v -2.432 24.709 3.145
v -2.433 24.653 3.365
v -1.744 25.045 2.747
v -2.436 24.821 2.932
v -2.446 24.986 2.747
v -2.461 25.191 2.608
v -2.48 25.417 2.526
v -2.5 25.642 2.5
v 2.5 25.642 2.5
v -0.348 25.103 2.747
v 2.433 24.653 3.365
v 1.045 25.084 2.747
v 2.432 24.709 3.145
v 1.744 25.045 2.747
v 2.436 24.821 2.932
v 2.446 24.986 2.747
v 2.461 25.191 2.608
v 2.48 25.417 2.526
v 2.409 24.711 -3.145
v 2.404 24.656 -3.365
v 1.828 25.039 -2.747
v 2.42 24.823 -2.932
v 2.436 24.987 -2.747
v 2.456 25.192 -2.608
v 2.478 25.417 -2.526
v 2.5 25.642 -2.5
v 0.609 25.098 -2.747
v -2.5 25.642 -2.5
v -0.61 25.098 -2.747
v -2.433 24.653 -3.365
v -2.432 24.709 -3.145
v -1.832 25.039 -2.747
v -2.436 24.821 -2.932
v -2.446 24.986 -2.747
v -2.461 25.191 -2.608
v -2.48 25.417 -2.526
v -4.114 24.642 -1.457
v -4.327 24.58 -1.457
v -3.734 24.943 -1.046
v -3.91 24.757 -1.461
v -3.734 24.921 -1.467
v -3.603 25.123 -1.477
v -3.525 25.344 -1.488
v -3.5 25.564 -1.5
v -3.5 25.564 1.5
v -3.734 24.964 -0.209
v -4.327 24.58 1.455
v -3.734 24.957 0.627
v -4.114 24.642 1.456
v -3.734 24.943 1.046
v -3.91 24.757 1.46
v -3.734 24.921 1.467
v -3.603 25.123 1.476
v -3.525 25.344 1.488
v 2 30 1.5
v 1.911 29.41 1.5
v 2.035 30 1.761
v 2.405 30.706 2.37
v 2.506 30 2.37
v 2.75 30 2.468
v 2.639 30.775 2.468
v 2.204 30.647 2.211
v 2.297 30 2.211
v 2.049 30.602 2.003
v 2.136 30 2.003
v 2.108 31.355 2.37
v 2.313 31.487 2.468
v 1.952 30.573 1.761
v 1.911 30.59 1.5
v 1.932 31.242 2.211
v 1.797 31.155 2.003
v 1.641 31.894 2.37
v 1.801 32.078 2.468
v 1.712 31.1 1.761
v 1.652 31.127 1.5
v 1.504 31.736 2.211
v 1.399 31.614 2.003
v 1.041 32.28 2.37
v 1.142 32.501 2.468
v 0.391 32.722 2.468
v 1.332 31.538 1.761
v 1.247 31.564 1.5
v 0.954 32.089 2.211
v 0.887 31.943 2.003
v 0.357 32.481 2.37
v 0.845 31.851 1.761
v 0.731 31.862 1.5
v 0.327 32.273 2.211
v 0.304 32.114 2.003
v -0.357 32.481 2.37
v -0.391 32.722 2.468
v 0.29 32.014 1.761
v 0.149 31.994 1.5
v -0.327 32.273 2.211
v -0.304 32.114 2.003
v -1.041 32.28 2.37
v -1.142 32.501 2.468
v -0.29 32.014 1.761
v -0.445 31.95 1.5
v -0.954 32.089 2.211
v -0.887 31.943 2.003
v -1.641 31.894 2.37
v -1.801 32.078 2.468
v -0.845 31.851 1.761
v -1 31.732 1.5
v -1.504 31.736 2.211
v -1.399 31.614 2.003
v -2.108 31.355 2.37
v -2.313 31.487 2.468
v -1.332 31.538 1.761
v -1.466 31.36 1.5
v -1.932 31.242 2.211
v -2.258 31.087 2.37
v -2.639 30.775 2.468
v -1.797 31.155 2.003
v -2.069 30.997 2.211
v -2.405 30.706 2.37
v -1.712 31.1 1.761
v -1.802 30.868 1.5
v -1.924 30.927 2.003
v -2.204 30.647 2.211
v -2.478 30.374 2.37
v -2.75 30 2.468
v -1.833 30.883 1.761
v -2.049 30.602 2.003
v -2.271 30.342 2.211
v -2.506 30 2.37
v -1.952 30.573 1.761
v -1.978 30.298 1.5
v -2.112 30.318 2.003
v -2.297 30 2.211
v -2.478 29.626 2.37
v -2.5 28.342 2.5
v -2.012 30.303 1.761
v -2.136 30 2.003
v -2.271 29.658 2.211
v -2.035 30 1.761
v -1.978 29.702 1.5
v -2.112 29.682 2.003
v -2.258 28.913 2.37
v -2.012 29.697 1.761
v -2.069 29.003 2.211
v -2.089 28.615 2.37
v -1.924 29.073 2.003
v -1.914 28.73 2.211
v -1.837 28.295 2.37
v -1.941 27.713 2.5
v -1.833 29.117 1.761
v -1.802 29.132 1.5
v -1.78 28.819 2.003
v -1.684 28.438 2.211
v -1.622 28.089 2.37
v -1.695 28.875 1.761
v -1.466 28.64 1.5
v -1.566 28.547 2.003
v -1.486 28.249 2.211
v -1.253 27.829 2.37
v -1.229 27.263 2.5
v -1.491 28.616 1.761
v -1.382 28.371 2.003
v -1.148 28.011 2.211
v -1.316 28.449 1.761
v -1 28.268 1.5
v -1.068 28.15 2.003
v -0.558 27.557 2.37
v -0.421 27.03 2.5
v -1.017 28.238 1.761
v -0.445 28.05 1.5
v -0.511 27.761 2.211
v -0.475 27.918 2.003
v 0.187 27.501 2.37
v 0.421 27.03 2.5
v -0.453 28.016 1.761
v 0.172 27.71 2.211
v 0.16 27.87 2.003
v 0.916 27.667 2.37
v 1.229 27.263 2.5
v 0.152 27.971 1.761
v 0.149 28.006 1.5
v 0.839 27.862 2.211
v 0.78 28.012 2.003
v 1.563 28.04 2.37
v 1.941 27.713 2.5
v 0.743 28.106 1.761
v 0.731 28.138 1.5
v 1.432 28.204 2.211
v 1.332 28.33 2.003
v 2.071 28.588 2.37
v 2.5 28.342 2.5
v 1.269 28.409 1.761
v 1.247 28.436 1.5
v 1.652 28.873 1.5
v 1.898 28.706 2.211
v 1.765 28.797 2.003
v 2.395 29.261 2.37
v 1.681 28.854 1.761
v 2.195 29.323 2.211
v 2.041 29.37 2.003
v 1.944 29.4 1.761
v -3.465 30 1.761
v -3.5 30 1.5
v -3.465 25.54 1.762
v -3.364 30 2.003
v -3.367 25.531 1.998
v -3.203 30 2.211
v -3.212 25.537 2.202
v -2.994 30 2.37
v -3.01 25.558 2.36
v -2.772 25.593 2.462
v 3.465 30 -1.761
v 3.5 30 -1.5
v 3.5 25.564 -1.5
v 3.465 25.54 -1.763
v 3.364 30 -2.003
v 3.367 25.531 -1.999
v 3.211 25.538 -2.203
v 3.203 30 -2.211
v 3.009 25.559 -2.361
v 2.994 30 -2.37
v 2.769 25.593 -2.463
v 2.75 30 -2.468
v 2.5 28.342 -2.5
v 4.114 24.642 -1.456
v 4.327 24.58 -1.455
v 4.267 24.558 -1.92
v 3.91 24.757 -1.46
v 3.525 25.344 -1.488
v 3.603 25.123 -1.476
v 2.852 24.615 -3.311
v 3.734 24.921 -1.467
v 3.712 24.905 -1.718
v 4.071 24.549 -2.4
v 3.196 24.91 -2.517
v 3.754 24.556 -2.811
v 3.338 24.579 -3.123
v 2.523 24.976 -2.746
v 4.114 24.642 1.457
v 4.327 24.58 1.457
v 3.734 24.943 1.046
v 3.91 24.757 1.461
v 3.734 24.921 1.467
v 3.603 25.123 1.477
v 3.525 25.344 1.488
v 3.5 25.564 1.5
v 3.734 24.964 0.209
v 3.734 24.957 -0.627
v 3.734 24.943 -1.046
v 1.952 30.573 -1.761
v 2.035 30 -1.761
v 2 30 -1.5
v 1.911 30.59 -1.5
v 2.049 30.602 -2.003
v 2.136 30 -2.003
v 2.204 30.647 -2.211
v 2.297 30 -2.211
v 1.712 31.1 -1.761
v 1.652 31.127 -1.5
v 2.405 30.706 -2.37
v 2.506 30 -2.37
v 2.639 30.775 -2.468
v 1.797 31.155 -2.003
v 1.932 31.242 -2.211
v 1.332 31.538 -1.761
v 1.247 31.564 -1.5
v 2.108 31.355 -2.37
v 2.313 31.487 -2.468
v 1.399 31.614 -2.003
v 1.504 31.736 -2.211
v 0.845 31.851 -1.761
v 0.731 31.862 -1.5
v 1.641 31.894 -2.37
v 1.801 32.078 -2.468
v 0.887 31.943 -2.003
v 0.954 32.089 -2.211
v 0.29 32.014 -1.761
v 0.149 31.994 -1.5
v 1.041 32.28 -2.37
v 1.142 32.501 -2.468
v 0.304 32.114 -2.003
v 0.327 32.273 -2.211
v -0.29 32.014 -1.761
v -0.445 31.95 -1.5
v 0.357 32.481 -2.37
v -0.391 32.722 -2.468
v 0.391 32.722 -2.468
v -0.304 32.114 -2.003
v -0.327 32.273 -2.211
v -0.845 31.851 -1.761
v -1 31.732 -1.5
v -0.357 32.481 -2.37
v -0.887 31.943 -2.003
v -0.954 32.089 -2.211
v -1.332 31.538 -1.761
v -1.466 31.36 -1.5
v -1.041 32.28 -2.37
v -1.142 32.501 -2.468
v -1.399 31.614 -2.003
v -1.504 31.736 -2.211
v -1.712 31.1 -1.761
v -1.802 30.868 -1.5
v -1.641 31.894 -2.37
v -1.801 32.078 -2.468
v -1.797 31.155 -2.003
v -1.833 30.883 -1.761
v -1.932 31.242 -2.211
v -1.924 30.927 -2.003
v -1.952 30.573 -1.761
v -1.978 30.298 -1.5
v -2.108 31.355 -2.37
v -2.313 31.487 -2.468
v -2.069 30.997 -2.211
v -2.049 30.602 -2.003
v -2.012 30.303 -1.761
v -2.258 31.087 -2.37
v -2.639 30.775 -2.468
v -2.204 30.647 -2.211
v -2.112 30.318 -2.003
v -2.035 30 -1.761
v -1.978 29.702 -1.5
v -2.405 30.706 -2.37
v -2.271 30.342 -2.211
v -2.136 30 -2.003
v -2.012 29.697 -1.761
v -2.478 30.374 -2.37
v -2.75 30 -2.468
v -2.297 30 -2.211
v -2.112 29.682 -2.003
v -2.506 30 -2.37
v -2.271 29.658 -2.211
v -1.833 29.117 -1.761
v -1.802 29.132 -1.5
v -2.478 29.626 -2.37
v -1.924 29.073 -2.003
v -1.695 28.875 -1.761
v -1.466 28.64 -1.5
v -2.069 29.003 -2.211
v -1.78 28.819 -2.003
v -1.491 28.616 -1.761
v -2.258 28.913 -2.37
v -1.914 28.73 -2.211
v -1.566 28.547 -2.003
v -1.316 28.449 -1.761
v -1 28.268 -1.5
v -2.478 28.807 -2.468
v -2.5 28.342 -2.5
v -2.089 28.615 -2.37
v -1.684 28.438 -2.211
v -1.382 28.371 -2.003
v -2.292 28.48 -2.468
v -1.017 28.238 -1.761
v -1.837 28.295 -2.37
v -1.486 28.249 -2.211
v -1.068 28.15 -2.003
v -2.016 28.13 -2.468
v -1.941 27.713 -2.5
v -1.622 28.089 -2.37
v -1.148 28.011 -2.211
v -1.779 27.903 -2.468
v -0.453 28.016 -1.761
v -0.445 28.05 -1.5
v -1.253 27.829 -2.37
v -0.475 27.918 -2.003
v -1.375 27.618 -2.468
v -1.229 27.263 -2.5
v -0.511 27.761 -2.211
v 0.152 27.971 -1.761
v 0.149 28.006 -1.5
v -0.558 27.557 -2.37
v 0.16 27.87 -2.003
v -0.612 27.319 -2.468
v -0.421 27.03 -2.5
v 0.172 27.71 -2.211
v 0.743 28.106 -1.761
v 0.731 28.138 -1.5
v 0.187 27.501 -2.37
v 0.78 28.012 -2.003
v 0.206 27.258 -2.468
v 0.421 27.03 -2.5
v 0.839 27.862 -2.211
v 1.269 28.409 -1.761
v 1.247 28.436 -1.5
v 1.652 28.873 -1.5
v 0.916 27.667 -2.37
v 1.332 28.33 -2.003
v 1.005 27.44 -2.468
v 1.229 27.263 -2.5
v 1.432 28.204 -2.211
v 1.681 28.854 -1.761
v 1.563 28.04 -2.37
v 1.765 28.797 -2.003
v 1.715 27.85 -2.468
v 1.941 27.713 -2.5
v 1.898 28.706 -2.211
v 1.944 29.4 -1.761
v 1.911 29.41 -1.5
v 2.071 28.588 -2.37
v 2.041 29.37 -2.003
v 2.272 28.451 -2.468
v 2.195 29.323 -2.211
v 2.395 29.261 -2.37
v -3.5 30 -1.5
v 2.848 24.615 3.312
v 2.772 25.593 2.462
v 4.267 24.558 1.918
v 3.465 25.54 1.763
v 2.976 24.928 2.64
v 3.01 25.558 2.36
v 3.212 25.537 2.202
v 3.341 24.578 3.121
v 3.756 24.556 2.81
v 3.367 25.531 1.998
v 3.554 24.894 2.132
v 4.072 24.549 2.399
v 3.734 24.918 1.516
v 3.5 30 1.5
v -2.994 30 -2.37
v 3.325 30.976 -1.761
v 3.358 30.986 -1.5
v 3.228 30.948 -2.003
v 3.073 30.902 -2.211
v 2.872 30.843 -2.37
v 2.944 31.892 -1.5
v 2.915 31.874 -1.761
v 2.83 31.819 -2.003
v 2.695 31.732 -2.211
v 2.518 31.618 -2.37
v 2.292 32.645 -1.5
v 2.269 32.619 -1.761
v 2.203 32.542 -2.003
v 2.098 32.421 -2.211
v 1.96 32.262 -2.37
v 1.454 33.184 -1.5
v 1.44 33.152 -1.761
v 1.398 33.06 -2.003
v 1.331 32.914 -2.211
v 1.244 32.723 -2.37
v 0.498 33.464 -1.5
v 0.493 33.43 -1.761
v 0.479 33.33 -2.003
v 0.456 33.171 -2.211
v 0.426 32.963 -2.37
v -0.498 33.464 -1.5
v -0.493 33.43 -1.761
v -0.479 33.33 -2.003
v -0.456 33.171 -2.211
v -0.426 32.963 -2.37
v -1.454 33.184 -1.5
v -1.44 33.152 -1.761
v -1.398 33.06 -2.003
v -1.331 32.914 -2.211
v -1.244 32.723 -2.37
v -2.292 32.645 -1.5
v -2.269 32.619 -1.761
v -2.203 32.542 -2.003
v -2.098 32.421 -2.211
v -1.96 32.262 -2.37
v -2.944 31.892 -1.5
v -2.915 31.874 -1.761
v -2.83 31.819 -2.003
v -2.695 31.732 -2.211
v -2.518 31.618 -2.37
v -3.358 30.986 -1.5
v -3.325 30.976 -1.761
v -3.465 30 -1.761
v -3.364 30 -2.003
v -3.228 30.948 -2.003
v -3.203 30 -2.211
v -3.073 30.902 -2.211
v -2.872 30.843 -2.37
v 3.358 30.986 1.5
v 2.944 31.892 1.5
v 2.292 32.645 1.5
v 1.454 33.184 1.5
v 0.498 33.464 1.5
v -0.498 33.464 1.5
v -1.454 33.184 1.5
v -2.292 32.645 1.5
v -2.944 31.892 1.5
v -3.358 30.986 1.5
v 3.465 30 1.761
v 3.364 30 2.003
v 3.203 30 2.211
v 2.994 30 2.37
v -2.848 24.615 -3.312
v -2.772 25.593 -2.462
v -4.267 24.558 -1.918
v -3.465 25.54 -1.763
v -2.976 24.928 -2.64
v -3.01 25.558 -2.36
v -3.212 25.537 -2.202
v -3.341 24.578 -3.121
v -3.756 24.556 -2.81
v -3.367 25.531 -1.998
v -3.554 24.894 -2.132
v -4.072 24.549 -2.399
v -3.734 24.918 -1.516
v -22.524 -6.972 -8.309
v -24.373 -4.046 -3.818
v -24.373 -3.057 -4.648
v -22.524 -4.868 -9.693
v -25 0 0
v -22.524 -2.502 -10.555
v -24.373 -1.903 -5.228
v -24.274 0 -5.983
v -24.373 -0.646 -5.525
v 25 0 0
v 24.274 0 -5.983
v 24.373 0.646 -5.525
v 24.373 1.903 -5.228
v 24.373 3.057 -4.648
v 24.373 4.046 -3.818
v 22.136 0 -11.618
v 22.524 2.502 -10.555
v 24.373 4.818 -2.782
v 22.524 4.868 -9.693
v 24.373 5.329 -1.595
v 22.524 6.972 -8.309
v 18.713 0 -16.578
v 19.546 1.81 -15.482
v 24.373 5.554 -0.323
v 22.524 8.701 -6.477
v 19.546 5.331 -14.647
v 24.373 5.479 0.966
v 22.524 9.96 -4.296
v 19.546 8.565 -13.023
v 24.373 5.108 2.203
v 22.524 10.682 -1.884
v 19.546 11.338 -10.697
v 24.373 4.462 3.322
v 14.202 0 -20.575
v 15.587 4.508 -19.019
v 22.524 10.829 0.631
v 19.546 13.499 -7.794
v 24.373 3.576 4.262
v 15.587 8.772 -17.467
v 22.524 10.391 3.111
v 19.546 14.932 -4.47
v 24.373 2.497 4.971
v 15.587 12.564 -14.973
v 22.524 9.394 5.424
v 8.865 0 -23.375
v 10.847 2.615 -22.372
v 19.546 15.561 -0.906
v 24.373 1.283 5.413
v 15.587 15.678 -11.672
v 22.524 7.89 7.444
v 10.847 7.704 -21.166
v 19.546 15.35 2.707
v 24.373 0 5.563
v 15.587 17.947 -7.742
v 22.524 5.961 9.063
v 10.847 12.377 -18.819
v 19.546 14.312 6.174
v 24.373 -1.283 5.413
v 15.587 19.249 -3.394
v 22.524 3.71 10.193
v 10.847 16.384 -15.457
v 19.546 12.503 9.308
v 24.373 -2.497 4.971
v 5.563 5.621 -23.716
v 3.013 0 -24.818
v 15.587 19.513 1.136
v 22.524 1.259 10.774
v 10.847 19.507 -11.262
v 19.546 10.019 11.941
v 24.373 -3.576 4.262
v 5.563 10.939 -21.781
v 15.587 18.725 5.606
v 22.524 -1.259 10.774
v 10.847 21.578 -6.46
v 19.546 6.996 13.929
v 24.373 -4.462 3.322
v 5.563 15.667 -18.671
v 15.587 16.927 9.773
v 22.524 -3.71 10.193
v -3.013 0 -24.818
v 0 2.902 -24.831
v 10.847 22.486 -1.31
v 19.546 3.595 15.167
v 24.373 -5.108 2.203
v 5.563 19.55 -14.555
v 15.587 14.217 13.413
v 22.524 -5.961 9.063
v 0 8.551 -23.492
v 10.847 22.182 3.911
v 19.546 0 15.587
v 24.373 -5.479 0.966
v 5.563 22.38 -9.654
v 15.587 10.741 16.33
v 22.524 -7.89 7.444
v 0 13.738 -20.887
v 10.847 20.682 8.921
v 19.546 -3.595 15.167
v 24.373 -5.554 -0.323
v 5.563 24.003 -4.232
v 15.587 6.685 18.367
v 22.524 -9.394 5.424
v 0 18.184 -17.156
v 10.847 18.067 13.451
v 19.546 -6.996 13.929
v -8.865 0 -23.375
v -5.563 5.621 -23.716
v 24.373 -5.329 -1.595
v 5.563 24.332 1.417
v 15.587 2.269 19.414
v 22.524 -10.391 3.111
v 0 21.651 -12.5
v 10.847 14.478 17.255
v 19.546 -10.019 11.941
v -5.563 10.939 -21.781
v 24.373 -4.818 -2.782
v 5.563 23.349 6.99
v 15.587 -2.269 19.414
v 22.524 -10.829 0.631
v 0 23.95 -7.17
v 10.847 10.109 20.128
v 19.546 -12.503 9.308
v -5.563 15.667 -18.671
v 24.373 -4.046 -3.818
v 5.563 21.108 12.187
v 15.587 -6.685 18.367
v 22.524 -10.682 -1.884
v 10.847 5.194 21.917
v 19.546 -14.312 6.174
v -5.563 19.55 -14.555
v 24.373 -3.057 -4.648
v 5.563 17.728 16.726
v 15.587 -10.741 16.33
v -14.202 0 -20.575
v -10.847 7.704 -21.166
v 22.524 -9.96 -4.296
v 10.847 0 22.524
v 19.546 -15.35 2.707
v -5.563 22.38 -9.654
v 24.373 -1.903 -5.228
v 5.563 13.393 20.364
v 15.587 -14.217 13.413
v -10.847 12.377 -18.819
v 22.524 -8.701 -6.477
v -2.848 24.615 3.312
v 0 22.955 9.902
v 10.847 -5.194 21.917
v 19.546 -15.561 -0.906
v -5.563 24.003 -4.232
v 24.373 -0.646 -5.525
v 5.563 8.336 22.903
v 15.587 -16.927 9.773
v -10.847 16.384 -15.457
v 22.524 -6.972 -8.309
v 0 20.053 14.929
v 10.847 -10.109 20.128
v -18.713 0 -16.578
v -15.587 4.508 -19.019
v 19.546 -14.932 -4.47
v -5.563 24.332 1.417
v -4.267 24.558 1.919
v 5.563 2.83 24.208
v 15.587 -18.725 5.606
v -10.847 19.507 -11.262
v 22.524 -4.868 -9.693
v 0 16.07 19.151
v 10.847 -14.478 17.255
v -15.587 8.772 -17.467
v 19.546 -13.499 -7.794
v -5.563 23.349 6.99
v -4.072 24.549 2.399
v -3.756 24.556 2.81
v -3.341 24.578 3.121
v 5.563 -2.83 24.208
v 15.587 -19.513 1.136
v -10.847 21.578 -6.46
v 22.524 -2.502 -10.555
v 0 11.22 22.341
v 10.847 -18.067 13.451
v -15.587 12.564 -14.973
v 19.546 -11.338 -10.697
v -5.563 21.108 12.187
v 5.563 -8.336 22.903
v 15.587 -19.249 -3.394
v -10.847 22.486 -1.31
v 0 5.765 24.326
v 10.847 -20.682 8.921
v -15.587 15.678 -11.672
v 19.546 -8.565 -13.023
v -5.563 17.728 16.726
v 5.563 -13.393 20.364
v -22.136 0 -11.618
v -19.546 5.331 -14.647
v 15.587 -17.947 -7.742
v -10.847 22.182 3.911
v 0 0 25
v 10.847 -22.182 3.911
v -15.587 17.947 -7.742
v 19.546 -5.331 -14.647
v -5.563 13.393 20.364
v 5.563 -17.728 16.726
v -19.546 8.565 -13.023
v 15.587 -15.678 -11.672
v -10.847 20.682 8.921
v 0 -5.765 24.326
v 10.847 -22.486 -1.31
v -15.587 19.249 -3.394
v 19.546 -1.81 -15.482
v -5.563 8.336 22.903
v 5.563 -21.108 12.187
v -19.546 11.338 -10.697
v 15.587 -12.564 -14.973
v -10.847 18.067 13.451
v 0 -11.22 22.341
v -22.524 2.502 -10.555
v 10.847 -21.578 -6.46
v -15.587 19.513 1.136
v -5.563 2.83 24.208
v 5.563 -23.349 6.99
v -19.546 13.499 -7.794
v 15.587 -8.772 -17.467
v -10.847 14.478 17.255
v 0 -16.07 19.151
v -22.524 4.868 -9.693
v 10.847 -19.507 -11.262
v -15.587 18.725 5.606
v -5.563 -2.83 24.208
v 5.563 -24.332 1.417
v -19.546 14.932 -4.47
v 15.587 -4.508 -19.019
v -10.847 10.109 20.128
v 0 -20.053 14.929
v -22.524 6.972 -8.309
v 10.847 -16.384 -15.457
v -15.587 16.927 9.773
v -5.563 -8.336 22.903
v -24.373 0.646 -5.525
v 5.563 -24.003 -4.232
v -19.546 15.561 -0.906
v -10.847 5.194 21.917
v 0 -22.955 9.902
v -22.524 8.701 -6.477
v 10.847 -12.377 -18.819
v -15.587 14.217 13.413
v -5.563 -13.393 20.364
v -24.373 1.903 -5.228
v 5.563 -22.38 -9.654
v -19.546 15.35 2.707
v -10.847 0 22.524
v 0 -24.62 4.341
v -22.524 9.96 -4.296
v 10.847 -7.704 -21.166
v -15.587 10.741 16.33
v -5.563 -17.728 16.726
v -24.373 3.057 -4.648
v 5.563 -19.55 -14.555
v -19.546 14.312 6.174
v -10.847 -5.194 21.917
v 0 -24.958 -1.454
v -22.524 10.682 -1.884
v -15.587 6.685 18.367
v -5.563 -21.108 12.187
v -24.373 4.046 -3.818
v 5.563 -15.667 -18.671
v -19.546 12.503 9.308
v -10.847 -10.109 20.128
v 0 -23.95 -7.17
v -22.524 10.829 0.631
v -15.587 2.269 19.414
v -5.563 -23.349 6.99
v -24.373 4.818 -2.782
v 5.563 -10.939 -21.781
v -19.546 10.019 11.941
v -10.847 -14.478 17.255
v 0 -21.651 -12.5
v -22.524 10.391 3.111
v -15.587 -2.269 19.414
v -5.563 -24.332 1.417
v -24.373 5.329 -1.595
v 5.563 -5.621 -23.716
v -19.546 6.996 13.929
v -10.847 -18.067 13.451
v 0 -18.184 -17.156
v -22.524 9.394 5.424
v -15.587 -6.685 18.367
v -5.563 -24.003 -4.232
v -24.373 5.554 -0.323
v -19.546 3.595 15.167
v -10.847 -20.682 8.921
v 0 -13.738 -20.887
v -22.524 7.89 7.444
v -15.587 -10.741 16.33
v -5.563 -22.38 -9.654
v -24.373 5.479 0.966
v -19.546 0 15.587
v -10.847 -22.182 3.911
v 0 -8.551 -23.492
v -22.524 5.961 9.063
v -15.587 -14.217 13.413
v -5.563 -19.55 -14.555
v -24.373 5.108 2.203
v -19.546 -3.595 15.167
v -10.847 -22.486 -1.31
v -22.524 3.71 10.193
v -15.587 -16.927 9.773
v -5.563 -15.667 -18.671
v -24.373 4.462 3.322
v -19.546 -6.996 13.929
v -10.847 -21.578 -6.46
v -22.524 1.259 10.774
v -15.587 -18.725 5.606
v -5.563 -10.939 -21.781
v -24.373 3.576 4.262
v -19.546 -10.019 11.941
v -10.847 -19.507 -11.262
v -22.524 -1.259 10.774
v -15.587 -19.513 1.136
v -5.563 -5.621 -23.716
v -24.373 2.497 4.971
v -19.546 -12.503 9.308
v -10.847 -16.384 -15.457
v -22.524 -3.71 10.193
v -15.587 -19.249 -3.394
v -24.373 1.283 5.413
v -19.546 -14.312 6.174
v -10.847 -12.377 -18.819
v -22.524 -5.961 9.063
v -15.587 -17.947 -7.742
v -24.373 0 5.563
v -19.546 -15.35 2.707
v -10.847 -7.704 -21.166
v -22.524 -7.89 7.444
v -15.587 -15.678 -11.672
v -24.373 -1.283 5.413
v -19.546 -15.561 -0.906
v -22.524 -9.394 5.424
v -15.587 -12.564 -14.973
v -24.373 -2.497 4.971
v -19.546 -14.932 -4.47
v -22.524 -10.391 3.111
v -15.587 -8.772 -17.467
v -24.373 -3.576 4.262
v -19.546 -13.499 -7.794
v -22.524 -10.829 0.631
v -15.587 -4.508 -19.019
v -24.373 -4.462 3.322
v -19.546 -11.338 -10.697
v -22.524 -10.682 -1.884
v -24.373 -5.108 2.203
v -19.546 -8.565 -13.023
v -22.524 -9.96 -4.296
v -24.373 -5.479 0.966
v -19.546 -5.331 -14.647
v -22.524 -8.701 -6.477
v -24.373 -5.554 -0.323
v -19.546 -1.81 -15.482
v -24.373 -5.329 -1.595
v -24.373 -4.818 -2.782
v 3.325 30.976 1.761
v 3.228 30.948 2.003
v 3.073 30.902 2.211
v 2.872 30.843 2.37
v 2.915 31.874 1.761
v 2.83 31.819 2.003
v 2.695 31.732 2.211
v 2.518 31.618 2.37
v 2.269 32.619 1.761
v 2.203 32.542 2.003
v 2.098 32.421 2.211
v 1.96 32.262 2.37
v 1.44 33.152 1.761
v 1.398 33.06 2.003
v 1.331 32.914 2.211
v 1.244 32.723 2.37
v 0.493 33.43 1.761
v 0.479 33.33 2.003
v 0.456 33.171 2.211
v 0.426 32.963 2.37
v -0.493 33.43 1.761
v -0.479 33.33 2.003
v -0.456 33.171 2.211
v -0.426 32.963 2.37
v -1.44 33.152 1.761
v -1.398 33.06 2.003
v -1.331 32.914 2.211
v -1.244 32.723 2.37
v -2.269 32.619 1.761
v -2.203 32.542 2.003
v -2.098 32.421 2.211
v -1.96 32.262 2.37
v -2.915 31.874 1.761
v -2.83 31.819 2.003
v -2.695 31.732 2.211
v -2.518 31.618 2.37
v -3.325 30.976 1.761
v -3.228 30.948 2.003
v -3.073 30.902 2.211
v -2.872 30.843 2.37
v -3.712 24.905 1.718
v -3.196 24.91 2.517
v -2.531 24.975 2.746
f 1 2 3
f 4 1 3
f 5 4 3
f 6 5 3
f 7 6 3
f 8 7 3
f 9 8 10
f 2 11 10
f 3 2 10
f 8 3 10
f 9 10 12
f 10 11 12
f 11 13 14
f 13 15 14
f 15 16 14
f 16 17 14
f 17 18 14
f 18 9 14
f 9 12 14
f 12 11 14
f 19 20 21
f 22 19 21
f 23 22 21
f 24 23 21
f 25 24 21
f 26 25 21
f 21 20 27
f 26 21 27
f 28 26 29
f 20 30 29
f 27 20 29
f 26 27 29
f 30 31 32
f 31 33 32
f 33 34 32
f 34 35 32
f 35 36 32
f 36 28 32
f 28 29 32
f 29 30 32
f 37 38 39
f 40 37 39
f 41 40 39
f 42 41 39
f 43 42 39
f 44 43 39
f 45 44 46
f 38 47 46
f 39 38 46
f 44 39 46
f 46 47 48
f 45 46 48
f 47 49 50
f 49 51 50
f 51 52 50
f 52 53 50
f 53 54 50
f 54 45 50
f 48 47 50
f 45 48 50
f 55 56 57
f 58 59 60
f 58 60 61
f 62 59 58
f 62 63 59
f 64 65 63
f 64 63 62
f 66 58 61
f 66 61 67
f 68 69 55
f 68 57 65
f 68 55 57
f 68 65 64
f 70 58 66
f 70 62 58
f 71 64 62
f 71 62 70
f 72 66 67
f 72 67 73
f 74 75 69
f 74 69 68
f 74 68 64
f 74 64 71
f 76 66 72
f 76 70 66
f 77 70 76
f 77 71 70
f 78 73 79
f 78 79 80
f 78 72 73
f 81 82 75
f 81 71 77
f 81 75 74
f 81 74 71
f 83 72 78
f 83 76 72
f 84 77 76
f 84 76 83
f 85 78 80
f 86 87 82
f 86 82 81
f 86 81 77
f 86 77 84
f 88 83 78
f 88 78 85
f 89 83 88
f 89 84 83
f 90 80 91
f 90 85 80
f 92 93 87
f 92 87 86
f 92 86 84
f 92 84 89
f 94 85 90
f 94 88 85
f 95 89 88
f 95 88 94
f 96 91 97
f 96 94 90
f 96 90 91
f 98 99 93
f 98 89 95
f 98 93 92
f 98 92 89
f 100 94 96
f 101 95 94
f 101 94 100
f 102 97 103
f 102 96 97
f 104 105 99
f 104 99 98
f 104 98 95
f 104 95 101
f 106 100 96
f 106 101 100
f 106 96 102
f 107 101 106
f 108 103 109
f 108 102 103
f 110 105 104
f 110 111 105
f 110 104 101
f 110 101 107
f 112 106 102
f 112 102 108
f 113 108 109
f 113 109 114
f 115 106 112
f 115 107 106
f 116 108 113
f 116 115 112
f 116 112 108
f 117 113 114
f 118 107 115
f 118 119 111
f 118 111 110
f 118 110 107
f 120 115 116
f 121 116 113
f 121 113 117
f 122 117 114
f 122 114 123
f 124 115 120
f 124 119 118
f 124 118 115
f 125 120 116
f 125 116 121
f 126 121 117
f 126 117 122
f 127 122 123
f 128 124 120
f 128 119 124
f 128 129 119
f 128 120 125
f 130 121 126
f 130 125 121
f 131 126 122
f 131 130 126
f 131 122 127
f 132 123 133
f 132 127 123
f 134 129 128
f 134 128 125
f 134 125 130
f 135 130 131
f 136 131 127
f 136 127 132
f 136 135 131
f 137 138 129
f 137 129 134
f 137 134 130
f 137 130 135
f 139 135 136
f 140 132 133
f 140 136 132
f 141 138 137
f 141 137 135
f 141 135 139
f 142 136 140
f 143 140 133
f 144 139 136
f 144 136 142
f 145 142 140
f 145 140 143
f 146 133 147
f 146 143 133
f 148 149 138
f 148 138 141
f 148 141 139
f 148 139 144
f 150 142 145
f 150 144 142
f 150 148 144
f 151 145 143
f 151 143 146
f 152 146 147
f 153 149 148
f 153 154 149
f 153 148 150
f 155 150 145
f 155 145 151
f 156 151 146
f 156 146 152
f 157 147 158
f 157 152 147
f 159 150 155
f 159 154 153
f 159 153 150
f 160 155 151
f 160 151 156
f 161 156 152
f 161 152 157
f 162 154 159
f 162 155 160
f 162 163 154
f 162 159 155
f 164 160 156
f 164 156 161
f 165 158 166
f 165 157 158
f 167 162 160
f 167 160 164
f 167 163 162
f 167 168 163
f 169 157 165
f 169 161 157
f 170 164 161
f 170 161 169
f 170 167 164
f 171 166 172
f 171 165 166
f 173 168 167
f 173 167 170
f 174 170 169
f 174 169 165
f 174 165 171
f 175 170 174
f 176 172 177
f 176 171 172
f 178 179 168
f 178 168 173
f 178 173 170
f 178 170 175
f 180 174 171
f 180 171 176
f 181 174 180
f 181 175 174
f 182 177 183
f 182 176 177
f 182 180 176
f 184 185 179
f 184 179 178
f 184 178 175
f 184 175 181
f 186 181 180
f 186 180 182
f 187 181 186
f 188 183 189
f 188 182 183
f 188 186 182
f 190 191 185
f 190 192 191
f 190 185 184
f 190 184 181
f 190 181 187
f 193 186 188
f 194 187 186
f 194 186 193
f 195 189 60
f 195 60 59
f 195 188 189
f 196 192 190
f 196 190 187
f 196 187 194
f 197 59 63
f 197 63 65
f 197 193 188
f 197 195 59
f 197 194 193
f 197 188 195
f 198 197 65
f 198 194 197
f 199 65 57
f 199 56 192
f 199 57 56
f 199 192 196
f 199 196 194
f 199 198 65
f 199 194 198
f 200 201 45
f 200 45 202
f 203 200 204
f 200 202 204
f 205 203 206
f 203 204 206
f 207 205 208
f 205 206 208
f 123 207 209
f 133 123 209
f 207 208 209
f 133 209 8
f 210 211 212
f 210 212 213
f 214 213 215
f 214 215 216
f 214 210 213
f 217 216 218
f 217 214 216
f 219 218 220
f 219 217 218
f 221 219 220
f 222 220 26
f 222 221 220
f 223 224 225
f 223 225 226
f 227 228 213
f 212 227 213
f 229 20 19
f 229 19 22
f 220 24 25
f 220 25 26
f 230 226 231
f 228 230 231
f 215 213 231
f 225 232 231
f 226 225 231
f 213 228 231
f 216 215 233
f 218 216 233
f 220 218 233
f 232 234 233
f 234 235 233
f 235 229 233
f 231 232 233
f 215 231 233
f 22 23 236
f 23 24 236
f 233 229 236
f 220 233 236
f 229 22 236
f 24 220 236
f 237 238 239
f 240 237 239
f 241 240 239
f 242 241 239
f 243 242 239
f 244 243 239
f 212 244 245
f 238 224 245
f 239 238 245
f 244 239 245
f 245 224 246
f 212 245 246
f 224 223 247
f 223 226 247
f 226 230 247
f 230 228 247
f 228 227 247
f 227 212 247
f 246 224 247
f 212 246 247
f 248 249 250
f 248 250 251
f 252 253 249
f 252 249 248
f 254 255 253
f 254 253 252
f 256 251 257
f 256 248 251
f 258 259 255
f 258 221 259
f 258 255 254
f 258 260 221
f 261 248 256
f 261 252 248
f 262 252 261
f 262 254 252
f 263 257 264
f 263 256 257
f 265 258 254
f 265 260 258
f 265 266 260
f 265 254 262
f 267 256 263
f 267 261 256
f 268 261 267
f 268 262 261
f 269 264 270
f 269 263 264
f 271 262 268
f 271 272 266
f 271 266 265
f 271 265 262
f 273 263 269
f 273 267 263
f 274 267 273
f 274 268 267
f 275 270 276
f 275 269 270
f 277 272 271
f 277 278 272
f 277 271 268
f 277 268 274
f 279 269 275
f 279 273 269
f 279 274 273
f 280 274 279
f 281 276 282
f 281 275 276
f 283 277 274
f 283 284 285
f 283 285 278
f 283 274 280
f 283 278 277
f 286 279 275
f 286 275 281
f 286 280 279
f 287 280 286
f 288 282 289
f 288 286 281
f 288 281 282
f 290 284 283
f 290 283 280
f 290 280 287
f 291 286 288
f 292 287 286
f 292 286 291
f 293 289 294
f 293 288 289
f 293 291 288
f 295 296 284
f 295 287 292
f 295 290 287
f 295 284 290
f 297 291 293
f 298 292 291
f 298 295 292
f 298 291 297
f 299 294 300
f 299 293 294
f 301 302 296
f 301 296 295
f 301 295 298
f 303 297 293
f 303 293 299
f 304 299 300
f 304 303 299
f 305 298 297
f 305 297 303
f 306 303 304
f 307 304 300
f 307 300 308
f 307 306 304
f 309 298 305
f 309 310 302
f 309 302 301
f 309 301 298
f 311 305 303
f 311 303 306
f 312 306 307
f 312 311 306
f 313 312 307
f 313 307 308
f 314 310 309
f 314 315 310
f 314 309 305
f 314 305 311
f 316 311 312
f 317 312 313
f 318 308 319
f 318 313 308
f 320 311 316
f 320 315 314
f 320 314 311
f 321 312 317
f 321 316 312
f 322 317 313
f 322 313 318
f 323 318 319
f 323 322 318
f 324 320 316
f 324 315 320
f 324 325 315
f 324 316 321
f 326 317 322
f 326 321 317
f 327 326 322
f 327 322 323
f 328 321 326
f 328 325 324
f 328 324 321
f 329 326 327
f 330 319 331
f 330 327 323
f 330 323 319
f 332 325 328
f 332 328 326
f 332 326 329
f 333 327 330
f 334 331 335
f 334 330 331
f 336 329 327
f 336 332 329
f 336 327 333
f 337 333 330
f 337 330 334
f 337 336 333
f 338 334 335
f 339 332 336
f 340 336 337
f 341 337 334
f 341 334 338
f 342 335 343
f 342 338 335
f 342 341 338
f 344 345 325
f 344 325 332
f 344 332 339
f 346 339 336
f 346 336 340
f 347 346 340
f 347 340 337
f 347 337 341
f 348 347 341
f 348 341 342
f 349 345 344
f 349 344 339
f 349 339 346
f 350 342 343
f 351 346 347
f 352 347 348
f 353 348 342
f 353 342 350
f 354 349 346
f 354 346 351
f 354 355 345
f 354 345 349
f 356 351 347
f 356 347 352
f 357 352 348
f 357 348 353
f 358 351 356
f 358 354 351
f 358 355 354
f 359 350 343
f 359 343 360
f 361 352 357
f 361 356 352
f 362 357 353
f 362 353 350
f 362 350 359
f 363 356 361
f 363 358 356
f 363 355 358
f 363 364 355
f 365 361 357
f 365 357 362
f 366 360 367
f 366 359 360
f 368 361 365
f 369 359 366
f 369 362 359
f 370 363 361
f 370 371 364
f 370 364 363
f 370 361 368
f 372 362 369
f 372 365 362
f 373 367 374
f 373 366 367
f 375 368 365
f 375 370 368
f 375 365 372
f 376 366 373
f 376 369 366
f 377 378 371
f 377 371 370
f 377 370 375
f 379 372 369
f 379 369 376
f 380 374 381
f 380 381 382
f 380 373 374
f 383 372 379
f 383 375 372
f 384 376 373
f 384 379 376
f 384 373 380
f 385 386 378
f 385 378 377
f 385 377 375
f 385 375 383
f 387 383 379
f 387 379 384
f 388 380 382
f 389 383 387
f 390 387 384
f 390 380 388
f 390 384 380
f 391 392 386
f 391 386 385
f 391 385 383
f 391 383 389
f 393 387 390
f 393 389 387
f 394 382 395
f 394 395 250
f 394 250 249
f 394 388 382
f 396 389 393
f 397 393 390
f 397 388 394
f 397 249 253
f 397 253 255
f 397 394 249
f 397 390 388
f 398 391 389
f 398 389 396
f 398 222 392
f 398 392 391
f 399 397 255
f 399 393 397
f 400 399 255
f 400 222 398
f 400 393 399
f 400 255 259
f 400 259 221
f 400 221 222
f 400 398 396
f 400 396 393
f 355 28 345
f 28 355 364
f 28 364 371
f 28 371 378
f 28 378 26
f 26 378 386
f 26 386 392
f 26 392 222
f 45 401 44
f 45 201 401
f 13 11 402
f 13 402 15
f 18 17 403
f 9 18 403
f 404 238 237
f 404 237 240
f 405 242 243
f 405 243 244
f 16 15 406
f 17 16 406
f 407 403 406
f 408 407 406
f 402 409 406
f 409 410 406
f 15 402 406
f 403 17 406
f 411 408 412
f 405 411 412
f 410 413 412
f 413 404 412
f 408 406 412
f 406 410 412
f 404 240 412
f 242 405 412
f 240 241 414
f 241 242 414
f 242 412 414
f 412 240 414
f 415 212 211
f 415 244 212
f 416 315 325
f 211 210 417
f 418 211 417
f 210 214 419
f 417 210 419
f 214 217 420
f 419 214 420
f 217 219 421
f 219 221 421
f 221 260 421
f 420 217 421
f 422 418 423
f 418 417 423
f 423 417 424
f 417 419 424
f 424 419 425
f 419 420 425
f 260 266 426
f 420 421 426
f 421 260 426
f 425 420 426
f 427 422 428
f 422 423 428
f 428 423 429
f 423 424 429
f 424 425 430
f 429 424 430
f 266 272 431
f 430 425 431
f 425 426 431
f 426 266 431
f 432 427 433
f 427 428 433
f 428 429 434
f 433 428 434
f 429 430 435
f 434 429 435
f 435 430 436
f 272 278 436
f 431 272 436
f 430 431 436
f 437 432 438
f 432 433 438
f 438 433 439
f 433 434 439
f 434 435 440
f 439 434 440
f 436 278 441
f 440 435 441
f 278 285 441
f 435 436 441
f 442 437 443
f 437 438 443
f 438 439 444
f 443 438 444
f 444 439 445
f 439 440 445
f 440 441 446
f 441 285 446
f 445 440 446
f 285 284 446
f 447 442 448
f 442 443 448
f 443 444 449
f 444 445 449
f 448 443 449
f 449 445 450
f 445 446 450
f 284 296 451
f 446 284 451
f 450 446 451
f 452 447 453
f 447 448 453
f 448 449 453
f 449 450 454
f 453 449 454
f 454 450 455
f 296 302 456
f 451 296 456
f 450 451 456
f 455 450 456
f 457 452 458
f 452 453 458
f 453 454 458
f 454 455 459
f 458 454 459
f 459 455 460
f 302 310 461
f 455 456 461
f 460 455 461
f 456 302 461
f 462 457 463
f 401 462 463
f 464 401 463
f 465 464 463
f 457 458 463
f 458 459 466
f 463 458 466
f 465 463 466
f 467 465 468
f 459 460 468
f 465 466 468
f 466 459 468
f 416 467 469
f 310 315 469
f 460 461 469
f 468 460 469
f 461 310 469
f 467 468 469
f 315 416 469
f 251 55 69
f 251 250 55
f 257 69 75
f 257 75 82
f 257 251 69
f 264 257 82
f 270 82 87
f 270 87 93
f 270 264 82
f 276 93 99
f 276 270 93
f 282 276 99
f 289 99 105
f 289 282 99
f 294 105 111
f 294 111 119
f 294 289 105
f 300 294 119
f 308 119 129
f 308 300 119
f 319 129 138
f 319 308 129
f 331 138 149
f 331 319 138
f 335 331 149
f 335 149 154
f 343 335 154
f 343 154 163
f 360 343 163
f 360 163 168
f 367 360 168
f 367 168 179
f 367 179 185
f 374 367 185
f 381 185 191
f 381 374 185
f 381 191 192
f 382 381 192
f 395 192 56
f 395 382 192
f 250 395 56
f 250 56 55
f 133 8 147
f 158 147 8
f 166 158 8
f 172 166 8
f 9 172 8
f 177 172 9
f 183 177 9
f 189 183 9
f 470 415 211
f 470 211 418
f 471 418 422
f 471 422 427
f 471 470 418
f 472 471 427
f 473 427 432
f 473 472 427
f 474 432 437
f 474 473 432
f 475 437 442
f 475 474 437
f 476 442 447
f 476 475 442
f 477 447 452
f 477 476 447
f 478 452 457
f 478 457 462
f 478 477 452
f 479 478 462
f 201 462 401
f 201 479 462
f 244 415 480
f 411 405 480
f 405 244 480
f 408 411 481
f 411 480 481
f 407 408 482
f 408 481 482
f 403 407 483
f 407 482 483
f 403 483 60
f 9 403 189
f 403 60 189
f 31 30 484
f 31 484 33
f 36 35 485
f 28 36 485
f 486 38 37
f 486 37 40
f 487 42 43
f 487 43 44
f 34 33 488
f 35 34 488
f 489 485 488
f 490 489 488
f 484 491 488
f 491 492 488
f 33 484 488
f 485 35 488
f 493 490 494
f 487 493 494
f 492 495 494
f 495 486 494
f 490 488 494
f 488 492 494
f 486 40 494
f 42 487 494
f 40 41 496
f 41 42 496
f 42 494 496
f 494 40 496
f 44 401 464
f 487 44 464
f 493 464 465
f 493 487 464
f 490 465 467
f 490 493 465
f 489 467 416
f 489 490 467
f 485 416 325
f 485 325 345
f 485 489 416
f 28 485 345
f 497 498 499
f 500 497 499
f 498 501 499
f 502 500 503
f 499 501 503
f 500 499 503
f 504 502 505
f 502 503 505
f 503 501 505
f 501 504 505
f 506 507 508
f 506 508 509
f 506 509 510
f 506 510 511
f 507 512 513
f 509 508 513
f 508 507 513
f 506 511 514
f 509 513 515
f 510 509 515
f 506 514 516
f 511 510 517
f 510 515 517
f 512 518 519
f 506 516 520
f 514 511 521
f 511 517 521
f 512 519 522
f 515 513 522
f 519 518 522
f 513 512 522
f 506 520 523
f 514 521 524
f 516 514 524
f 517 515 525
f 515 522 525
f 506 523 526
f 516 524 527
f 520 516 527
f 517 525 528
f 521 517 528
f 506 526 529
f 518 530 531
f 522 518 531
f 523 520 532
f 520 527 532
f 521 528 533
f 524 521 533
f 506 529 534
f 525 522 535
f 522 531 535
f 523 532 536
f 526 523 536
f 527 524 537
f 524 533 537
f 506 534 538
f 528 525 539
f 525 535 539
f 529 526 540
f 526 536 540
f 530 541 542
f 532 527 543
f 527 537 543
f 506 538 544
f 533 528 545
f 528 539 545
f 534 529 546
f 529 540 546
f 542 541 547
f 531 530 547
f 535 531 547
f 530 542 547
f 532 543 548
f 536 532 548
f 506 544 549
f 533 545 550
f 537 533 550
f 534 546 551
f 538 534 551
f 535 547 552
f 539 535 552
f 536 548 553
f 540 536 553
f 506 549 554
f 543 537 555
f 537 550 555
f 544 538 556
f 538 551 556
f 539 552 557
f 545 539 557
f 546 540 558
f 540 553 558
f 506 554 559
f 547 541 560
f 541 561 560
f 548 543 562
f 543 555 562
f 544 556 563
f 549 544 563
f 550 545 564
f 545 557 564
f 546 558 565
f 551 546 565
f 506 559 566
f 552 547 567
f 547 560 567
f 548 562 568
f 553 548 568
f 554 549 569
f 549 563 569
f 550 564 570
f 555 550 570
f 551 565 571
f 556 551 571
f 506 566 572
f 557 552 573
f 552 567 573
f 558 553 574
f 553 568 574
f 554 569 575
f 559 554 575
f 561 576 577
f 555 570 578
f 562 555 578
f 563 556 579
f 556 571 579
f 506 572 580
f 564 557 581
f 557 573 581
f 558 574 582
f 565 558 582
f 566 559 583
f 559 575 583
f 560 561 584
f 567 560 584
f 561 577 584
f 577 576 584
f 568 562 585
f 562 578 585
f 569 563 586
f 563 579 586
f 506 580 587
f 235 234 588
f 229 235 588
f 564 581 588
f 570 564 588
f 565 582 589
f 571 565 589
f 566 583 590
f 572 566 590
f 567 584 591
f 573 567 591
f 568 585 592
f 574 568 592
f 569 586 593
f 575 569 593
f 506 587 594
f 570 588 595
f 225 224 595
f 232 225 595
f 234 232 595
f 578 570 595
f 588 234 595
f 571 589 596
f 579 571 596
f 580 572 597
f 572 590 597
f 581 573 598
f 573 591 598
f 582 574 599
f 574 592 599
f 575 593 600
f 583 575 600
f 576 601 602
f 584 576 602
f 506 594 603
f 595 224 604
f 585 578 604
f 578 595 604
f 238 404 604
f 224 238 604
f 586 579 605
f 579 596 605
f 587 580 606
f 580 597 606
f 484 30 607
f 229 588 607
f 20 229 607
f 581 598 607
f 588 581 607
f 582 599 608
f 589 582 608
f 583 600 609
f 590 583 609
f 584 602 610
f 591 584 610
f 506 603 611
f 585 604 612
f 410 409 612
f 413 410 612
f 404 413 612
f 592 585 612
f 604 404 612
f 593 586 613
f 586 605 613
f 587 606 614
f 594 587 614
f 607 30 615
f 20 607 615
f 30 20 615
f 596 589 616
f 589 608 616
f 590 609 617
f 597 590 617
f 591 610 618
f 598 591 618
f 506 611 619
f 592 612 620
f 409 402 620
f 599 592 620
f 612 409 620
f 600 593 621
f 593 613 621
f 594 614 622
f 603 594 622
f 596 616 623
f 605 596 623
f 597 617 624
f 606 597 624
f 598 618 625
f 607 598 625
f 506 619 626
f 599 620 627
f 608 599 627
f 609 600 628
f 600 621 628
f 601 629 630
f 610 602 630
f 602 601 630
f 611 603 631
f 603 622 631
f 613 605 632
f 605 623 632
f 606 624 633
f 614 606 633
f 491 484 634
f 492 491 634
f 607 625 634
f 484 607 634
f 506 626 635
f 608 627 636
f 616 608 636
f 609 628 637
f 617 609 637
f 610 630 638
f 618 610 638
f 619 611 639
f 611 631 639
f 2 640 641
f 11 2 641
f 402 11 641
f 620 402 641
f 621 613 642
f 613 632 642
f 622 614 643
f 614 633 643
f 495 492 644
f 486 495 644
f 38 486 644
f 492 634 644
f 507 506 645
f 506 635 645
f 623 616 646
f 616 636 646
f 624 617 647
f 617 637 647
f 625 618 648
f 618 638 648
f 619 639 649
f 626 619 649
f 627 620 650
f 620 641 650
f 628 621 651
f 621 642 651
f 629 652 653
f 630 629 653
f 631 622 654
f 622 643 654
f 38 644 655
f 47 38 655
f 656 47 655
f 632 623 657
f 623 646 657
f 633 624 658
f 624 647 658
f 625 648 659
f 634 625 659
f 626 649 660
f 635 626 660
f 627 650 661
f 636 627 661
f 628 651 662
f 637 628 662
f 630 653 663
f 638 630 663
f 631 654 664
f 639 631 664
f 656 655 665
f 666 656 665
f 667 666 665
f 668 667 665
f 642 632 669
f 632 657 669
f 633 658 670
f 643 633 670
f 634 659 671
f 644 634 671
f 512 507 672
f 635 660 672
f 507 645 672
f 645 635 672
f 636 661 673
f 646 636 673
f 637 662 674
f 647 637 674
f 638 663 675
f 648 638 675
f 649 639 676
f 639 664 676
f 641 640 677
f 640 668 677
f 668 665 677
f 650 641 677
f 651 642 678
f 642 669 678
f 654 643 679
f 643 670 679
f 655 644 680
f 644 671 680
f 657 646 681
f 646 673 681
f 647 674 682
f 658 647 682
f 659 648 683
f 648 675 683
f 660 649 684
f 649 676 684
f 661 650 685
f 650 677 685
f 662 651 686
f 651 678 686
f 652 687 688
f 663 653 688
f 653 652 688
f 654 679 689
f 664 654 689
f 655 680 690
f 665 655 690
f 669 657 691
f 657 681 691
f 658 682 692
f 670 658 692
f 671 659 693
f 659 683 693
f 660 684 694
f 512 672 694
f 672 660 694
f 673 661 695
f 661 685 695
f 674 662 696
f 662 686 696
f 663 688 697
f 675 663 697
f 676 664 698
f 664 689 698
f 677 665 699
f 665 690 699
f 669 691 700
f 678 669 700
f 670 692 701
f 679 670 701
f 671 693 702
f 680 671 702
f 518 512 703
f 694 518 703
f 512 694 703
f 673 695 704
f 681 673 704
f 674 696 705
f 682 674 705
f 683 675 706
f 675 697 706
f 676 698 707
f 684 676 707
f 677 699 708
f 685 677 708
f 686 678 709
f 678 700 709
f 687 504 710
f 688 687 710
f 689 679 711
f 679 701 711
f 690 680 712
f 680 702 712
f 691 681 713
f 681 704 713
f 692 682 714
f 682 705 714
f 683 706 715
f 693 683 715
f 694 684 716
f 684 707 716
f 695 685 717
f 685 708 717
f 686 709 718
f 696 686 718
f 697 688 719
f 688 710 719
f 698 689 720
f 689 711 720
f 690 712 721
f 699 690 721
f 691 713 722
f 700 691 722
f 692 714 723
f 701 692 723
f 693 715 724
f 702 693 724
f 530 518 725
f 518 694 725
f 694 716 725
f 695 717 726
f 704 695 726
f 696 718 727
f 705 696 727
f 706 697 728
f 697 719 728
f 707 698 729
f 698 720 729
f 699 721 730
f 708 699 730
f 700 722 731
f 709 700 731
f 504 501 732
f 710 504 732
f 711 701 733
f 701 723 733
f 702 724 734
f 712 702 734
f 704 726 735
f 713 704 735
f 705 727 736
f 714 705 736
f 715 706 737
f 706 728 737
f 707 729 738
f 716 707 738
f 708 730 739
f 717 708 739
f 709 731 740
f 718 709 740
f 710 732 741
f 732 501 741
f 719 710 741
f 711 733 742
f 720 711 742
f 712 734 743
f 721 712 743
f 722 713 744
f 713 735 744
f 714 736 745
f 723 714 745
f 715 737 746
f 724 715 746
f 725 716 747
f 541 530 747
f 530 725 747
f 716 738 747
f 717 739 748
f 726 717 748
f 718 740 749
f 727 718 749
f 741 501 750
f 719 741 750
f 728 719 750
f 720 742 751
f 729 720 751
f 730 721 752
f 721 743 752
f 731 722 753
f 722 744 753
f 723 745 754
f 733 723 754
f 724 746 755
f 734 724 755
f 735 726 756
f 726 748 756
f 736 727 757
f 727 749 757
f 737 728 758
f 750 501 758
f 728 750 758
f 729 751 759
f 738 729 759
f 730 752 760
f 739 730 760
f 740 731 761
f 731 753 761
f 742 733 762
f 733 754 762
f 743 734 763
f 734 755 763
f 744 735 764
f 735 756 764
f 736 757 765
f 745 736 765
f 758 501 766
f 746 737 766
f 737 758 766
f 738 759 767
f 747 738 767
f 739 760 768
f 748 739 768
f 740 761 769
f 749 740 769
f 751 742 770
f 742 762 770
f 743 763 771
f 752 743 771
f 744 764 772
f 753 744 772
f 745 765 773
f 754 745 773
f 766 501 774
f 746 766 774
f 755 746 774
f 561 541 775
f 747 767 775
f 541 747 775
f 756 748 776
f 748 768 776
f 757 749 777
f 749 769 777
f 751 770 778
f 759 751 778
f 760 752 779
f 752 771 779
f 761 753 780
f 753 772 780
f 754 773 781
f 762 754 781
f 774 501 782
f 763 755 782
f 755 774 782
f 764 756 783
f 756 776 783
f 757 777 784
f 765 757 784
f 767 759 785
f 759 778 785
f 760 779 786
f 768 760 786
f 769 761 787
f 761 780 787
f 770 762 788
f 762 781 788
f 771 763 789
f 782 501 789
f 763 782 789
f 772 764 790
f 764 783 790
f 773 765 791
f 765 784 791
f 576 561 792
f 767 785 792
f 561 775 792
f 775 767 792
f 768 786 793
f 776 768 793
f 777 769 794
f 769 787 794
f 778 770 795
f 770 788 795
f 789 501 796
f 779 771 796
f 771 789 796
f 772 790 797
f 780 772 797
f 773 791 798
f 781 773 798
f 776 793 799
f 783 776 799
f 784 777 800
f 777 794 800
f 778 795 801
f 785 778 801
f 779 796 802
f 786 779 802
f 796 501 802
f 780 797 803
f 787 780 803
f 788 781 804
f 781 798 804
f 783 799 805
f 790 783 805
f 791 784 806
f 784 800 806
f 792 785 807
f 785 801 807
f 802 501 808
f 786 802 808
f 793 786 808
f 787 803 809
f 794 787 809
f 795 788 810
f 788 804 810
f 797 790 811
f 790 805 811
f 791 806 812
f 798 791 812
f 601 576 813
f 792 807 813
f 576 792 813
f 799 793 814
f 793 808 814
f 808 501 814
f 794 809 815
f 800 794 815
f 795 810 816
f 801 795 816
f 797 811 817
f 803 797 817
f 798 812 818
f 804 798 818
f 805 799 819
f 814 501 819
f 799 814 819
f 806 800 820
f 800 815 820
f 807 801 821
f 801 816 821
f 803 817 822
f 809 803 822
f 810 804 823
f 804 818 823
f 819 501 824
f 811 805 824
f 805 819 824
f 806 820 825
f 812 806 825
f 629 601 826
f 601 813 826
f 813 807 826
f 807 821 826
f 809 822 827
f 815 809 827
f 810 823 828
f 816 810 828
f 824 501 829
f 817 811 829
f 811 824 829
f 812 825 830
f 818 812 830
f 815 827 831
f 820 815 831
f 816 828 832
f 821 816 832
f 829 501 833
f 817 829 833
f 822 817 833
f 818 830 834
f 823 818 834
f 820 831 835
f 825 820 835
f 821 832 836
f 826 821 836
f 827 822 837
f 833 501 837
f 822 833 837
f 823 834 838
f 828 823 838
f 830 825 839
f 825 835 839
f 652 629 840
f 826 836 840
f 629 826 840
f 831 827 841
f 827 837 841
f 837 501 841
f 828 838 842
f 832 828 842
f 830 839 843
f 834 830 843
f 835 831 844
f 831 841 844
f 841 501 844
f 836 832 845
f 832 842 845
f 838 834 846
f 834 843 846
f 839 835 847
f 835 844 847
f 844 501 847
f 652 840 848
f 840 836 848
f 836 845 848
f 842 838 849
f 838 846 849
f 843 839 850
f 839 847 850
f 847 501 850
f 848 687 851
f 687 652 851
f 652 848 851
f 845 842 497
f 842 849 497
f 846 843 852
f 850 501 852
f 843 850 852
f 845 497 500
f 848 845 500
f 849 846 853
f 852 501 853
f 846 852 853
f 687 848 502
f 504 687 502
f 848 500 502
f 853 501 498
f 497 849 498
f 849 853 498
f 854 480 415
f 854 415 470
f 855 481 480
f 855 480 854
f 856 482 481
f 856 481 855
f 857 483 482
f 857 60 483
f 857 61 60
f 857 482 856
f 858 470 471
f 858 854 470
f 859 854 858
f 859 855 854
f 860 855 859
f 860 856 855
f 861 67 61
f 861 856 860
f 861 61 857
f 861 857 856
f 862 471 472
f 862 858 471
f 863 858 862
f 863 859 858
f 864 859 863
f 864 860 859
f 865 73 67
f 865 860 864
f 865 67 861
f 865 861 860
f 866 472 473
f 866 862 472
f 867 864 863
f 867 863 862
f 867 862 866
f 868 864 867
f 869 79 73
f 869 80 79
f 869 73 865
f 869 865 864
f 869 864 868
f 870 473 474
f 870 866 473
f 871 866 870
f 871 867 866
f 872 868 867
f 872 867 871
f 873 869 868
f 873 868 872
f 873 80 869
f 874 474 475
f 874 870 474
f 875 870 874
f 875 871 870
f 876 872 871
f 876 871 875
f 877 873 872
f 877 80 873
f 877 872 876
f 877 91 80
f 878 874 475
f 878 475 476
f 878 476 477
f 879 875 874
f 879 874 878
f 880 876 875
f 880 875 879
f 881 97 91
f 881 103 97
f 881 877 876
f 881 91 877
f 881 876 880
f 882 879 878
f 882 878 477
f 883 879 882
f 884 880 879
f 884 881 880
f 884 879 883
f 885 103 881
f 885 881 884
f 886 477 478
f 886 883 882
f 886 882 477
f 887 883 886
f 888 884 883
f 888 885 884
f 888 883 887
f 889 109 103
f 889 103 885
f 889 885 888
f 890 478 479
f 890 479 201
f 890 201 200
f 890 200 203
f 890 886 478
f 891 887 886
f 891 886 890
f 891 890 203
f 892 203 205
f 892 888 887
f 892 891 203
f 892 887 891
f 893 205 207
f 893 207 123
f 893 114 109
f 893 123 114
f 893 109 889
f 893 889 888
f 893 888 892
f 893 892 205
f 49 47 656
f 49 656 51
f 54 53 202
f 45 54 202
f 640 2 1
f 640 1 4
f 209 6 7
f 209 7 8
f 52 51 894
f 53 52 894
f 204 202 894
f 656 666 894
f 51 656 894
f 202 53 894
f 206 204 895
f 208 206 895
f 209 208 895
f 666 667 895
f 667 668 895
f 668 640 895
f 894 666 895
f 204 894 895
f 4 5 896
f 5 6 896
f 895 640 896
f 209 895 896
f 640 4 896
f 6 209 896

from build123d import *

# Parameters (mm, degrees)
SKETCH2_R           = 2
BOSS_EXTRUDE1_DEPTH = 2.5
FILLET1_R           = 1


with BuildPart() as part:
    # Sketch1 → Revolve1 (revolve)
    with BuildSketch(Plane(origin=(0, 0, 0), x_dir=(1, 0, 0), z_dir=(0, 1, 0))):
        with BuildLine():
            Line((-25, 0), (25, 0))
            ThreePointArc((25, 0), (0, 25), (-25, 0))
        make_face()
    revolve(axis=Axis((-25, 0, 0), (1, 0, 0)))

    # Sketch2 → Boss-Extrude1 (add, symmetric)
    with BuildSketch(Plane.XY):
        with BuildLine():
            Line((-3.5, 20), (3.5, 20))
            Line((3.5, 20), (3.5, 30))
            ThreePointArc((3.5, 30), (0, 33.5), (-3.5, 30))
            Line((-3.5, 30), (-3.5, 20))
        make_face()
        with Locations((0, 30)):
            Circle(SKETCH2_R, mode=Mode.SUBTRACT)
    extrude(amount=BOSS_EXTRUDE1_DEPTH, both=True)

    # Fillet1
    fillet1_edges = [part.edges().sort_by_distance(p)[0] for p in [
        (-3.5, 27.313610356, 2.5),
        (3.5, 27.313610356, 2.5),
        (0, 33.5, 2.5),
    ]]
    fillet(fillet1_edges, radius=FILLET1_R)
    fillet1_2_edges = [part.edges().sort_by_distance(p)[0] for p in [
        (-3.5, 27.313610356, -2.5),
        (0, 33.5, -2.5),
        (3.5, 27.313610356, -2.5),
    ]]
    fillet(fillet1_2_edges, radius=FILLET1_R)
    fillet1_3_edges = [part.edges().sort_by_distance(p)[0] for p in [
        (0, 24.874685928, -2.5),
    ]]
    fillet(fillet1_3_edges, radius=FILLET1_R)
    # the kernel refuses this fillet: 1 mm, written as the material it takes off along each edge
    with BuildSketch(Plane(origin=(0, 30, -2.5), x_dir=(1, 0, 0), z_dir=(0, -1, 0))) as fillet1_4_piece_1:
        with BuildLine():
            CenterArc((2 + FILLET1_R, FILLET1_R), FILLET1_R, 180, 90)
            Line((2, FILLET1_R), (2 - FILLET1_R * 0.02, FILLET1_R))
            Line((2 - FILLET1_R * 0.02, FILLET1_R), (2 - FILLET1_R * 0.02, -FILLET1_R * 0.02))
            Line((2 - FILLET1_R * 0.02, -FILLET1_R * 0.02), (2 + FILLET1_R, -FILLET1_R * 0.02))
            Line((2 + FILLET1_R, -FILLET1_R * 0.02), (2 + FILLET1_R, 0))
        make_face()
    revolve(axis=Axis((0, 30, -2.5), (0, 0, 1)), mode=Mode.SUBTRACT)
    # the kernel refuses this fillet: 1 mm, written as the material it takes off along each edge
    with BuildSketch(Plane(origin=(0, 30, 2.5), x_dir=(1, 0, 0), z_dir=(0, -1, 0))) as fillet1_5_piece_1:
        with BuildLine():
            CenterArc((2 + FILLET1_R, -FILLET1_R), FILLET1_R, 90, 90)
            Line((2, -FILLET1_R), (2 - FILLET1_R * 0.02, -FILLET1_R))
            Line((2 - FILLET1_R * 0.02, -FILLET1_R), (2 - FILLET1_R * 0.02, FILLET1_R * 0.02))
            Line((2 - FILLET1_R * 0.02, FILLET1_R * 0.02), (2 + FILLET1_R, FILLET1_R * 0.02))
            Line((2 + FILLET1_R, FILLET1_R * 0.02), (2 + FILLET1_R, 0))
        make_face()
    revolve(axis=Axis((0, 30, 2.5), (0, 0, 1)), mode=Mode.SUBTRACT)


solid = part.part
